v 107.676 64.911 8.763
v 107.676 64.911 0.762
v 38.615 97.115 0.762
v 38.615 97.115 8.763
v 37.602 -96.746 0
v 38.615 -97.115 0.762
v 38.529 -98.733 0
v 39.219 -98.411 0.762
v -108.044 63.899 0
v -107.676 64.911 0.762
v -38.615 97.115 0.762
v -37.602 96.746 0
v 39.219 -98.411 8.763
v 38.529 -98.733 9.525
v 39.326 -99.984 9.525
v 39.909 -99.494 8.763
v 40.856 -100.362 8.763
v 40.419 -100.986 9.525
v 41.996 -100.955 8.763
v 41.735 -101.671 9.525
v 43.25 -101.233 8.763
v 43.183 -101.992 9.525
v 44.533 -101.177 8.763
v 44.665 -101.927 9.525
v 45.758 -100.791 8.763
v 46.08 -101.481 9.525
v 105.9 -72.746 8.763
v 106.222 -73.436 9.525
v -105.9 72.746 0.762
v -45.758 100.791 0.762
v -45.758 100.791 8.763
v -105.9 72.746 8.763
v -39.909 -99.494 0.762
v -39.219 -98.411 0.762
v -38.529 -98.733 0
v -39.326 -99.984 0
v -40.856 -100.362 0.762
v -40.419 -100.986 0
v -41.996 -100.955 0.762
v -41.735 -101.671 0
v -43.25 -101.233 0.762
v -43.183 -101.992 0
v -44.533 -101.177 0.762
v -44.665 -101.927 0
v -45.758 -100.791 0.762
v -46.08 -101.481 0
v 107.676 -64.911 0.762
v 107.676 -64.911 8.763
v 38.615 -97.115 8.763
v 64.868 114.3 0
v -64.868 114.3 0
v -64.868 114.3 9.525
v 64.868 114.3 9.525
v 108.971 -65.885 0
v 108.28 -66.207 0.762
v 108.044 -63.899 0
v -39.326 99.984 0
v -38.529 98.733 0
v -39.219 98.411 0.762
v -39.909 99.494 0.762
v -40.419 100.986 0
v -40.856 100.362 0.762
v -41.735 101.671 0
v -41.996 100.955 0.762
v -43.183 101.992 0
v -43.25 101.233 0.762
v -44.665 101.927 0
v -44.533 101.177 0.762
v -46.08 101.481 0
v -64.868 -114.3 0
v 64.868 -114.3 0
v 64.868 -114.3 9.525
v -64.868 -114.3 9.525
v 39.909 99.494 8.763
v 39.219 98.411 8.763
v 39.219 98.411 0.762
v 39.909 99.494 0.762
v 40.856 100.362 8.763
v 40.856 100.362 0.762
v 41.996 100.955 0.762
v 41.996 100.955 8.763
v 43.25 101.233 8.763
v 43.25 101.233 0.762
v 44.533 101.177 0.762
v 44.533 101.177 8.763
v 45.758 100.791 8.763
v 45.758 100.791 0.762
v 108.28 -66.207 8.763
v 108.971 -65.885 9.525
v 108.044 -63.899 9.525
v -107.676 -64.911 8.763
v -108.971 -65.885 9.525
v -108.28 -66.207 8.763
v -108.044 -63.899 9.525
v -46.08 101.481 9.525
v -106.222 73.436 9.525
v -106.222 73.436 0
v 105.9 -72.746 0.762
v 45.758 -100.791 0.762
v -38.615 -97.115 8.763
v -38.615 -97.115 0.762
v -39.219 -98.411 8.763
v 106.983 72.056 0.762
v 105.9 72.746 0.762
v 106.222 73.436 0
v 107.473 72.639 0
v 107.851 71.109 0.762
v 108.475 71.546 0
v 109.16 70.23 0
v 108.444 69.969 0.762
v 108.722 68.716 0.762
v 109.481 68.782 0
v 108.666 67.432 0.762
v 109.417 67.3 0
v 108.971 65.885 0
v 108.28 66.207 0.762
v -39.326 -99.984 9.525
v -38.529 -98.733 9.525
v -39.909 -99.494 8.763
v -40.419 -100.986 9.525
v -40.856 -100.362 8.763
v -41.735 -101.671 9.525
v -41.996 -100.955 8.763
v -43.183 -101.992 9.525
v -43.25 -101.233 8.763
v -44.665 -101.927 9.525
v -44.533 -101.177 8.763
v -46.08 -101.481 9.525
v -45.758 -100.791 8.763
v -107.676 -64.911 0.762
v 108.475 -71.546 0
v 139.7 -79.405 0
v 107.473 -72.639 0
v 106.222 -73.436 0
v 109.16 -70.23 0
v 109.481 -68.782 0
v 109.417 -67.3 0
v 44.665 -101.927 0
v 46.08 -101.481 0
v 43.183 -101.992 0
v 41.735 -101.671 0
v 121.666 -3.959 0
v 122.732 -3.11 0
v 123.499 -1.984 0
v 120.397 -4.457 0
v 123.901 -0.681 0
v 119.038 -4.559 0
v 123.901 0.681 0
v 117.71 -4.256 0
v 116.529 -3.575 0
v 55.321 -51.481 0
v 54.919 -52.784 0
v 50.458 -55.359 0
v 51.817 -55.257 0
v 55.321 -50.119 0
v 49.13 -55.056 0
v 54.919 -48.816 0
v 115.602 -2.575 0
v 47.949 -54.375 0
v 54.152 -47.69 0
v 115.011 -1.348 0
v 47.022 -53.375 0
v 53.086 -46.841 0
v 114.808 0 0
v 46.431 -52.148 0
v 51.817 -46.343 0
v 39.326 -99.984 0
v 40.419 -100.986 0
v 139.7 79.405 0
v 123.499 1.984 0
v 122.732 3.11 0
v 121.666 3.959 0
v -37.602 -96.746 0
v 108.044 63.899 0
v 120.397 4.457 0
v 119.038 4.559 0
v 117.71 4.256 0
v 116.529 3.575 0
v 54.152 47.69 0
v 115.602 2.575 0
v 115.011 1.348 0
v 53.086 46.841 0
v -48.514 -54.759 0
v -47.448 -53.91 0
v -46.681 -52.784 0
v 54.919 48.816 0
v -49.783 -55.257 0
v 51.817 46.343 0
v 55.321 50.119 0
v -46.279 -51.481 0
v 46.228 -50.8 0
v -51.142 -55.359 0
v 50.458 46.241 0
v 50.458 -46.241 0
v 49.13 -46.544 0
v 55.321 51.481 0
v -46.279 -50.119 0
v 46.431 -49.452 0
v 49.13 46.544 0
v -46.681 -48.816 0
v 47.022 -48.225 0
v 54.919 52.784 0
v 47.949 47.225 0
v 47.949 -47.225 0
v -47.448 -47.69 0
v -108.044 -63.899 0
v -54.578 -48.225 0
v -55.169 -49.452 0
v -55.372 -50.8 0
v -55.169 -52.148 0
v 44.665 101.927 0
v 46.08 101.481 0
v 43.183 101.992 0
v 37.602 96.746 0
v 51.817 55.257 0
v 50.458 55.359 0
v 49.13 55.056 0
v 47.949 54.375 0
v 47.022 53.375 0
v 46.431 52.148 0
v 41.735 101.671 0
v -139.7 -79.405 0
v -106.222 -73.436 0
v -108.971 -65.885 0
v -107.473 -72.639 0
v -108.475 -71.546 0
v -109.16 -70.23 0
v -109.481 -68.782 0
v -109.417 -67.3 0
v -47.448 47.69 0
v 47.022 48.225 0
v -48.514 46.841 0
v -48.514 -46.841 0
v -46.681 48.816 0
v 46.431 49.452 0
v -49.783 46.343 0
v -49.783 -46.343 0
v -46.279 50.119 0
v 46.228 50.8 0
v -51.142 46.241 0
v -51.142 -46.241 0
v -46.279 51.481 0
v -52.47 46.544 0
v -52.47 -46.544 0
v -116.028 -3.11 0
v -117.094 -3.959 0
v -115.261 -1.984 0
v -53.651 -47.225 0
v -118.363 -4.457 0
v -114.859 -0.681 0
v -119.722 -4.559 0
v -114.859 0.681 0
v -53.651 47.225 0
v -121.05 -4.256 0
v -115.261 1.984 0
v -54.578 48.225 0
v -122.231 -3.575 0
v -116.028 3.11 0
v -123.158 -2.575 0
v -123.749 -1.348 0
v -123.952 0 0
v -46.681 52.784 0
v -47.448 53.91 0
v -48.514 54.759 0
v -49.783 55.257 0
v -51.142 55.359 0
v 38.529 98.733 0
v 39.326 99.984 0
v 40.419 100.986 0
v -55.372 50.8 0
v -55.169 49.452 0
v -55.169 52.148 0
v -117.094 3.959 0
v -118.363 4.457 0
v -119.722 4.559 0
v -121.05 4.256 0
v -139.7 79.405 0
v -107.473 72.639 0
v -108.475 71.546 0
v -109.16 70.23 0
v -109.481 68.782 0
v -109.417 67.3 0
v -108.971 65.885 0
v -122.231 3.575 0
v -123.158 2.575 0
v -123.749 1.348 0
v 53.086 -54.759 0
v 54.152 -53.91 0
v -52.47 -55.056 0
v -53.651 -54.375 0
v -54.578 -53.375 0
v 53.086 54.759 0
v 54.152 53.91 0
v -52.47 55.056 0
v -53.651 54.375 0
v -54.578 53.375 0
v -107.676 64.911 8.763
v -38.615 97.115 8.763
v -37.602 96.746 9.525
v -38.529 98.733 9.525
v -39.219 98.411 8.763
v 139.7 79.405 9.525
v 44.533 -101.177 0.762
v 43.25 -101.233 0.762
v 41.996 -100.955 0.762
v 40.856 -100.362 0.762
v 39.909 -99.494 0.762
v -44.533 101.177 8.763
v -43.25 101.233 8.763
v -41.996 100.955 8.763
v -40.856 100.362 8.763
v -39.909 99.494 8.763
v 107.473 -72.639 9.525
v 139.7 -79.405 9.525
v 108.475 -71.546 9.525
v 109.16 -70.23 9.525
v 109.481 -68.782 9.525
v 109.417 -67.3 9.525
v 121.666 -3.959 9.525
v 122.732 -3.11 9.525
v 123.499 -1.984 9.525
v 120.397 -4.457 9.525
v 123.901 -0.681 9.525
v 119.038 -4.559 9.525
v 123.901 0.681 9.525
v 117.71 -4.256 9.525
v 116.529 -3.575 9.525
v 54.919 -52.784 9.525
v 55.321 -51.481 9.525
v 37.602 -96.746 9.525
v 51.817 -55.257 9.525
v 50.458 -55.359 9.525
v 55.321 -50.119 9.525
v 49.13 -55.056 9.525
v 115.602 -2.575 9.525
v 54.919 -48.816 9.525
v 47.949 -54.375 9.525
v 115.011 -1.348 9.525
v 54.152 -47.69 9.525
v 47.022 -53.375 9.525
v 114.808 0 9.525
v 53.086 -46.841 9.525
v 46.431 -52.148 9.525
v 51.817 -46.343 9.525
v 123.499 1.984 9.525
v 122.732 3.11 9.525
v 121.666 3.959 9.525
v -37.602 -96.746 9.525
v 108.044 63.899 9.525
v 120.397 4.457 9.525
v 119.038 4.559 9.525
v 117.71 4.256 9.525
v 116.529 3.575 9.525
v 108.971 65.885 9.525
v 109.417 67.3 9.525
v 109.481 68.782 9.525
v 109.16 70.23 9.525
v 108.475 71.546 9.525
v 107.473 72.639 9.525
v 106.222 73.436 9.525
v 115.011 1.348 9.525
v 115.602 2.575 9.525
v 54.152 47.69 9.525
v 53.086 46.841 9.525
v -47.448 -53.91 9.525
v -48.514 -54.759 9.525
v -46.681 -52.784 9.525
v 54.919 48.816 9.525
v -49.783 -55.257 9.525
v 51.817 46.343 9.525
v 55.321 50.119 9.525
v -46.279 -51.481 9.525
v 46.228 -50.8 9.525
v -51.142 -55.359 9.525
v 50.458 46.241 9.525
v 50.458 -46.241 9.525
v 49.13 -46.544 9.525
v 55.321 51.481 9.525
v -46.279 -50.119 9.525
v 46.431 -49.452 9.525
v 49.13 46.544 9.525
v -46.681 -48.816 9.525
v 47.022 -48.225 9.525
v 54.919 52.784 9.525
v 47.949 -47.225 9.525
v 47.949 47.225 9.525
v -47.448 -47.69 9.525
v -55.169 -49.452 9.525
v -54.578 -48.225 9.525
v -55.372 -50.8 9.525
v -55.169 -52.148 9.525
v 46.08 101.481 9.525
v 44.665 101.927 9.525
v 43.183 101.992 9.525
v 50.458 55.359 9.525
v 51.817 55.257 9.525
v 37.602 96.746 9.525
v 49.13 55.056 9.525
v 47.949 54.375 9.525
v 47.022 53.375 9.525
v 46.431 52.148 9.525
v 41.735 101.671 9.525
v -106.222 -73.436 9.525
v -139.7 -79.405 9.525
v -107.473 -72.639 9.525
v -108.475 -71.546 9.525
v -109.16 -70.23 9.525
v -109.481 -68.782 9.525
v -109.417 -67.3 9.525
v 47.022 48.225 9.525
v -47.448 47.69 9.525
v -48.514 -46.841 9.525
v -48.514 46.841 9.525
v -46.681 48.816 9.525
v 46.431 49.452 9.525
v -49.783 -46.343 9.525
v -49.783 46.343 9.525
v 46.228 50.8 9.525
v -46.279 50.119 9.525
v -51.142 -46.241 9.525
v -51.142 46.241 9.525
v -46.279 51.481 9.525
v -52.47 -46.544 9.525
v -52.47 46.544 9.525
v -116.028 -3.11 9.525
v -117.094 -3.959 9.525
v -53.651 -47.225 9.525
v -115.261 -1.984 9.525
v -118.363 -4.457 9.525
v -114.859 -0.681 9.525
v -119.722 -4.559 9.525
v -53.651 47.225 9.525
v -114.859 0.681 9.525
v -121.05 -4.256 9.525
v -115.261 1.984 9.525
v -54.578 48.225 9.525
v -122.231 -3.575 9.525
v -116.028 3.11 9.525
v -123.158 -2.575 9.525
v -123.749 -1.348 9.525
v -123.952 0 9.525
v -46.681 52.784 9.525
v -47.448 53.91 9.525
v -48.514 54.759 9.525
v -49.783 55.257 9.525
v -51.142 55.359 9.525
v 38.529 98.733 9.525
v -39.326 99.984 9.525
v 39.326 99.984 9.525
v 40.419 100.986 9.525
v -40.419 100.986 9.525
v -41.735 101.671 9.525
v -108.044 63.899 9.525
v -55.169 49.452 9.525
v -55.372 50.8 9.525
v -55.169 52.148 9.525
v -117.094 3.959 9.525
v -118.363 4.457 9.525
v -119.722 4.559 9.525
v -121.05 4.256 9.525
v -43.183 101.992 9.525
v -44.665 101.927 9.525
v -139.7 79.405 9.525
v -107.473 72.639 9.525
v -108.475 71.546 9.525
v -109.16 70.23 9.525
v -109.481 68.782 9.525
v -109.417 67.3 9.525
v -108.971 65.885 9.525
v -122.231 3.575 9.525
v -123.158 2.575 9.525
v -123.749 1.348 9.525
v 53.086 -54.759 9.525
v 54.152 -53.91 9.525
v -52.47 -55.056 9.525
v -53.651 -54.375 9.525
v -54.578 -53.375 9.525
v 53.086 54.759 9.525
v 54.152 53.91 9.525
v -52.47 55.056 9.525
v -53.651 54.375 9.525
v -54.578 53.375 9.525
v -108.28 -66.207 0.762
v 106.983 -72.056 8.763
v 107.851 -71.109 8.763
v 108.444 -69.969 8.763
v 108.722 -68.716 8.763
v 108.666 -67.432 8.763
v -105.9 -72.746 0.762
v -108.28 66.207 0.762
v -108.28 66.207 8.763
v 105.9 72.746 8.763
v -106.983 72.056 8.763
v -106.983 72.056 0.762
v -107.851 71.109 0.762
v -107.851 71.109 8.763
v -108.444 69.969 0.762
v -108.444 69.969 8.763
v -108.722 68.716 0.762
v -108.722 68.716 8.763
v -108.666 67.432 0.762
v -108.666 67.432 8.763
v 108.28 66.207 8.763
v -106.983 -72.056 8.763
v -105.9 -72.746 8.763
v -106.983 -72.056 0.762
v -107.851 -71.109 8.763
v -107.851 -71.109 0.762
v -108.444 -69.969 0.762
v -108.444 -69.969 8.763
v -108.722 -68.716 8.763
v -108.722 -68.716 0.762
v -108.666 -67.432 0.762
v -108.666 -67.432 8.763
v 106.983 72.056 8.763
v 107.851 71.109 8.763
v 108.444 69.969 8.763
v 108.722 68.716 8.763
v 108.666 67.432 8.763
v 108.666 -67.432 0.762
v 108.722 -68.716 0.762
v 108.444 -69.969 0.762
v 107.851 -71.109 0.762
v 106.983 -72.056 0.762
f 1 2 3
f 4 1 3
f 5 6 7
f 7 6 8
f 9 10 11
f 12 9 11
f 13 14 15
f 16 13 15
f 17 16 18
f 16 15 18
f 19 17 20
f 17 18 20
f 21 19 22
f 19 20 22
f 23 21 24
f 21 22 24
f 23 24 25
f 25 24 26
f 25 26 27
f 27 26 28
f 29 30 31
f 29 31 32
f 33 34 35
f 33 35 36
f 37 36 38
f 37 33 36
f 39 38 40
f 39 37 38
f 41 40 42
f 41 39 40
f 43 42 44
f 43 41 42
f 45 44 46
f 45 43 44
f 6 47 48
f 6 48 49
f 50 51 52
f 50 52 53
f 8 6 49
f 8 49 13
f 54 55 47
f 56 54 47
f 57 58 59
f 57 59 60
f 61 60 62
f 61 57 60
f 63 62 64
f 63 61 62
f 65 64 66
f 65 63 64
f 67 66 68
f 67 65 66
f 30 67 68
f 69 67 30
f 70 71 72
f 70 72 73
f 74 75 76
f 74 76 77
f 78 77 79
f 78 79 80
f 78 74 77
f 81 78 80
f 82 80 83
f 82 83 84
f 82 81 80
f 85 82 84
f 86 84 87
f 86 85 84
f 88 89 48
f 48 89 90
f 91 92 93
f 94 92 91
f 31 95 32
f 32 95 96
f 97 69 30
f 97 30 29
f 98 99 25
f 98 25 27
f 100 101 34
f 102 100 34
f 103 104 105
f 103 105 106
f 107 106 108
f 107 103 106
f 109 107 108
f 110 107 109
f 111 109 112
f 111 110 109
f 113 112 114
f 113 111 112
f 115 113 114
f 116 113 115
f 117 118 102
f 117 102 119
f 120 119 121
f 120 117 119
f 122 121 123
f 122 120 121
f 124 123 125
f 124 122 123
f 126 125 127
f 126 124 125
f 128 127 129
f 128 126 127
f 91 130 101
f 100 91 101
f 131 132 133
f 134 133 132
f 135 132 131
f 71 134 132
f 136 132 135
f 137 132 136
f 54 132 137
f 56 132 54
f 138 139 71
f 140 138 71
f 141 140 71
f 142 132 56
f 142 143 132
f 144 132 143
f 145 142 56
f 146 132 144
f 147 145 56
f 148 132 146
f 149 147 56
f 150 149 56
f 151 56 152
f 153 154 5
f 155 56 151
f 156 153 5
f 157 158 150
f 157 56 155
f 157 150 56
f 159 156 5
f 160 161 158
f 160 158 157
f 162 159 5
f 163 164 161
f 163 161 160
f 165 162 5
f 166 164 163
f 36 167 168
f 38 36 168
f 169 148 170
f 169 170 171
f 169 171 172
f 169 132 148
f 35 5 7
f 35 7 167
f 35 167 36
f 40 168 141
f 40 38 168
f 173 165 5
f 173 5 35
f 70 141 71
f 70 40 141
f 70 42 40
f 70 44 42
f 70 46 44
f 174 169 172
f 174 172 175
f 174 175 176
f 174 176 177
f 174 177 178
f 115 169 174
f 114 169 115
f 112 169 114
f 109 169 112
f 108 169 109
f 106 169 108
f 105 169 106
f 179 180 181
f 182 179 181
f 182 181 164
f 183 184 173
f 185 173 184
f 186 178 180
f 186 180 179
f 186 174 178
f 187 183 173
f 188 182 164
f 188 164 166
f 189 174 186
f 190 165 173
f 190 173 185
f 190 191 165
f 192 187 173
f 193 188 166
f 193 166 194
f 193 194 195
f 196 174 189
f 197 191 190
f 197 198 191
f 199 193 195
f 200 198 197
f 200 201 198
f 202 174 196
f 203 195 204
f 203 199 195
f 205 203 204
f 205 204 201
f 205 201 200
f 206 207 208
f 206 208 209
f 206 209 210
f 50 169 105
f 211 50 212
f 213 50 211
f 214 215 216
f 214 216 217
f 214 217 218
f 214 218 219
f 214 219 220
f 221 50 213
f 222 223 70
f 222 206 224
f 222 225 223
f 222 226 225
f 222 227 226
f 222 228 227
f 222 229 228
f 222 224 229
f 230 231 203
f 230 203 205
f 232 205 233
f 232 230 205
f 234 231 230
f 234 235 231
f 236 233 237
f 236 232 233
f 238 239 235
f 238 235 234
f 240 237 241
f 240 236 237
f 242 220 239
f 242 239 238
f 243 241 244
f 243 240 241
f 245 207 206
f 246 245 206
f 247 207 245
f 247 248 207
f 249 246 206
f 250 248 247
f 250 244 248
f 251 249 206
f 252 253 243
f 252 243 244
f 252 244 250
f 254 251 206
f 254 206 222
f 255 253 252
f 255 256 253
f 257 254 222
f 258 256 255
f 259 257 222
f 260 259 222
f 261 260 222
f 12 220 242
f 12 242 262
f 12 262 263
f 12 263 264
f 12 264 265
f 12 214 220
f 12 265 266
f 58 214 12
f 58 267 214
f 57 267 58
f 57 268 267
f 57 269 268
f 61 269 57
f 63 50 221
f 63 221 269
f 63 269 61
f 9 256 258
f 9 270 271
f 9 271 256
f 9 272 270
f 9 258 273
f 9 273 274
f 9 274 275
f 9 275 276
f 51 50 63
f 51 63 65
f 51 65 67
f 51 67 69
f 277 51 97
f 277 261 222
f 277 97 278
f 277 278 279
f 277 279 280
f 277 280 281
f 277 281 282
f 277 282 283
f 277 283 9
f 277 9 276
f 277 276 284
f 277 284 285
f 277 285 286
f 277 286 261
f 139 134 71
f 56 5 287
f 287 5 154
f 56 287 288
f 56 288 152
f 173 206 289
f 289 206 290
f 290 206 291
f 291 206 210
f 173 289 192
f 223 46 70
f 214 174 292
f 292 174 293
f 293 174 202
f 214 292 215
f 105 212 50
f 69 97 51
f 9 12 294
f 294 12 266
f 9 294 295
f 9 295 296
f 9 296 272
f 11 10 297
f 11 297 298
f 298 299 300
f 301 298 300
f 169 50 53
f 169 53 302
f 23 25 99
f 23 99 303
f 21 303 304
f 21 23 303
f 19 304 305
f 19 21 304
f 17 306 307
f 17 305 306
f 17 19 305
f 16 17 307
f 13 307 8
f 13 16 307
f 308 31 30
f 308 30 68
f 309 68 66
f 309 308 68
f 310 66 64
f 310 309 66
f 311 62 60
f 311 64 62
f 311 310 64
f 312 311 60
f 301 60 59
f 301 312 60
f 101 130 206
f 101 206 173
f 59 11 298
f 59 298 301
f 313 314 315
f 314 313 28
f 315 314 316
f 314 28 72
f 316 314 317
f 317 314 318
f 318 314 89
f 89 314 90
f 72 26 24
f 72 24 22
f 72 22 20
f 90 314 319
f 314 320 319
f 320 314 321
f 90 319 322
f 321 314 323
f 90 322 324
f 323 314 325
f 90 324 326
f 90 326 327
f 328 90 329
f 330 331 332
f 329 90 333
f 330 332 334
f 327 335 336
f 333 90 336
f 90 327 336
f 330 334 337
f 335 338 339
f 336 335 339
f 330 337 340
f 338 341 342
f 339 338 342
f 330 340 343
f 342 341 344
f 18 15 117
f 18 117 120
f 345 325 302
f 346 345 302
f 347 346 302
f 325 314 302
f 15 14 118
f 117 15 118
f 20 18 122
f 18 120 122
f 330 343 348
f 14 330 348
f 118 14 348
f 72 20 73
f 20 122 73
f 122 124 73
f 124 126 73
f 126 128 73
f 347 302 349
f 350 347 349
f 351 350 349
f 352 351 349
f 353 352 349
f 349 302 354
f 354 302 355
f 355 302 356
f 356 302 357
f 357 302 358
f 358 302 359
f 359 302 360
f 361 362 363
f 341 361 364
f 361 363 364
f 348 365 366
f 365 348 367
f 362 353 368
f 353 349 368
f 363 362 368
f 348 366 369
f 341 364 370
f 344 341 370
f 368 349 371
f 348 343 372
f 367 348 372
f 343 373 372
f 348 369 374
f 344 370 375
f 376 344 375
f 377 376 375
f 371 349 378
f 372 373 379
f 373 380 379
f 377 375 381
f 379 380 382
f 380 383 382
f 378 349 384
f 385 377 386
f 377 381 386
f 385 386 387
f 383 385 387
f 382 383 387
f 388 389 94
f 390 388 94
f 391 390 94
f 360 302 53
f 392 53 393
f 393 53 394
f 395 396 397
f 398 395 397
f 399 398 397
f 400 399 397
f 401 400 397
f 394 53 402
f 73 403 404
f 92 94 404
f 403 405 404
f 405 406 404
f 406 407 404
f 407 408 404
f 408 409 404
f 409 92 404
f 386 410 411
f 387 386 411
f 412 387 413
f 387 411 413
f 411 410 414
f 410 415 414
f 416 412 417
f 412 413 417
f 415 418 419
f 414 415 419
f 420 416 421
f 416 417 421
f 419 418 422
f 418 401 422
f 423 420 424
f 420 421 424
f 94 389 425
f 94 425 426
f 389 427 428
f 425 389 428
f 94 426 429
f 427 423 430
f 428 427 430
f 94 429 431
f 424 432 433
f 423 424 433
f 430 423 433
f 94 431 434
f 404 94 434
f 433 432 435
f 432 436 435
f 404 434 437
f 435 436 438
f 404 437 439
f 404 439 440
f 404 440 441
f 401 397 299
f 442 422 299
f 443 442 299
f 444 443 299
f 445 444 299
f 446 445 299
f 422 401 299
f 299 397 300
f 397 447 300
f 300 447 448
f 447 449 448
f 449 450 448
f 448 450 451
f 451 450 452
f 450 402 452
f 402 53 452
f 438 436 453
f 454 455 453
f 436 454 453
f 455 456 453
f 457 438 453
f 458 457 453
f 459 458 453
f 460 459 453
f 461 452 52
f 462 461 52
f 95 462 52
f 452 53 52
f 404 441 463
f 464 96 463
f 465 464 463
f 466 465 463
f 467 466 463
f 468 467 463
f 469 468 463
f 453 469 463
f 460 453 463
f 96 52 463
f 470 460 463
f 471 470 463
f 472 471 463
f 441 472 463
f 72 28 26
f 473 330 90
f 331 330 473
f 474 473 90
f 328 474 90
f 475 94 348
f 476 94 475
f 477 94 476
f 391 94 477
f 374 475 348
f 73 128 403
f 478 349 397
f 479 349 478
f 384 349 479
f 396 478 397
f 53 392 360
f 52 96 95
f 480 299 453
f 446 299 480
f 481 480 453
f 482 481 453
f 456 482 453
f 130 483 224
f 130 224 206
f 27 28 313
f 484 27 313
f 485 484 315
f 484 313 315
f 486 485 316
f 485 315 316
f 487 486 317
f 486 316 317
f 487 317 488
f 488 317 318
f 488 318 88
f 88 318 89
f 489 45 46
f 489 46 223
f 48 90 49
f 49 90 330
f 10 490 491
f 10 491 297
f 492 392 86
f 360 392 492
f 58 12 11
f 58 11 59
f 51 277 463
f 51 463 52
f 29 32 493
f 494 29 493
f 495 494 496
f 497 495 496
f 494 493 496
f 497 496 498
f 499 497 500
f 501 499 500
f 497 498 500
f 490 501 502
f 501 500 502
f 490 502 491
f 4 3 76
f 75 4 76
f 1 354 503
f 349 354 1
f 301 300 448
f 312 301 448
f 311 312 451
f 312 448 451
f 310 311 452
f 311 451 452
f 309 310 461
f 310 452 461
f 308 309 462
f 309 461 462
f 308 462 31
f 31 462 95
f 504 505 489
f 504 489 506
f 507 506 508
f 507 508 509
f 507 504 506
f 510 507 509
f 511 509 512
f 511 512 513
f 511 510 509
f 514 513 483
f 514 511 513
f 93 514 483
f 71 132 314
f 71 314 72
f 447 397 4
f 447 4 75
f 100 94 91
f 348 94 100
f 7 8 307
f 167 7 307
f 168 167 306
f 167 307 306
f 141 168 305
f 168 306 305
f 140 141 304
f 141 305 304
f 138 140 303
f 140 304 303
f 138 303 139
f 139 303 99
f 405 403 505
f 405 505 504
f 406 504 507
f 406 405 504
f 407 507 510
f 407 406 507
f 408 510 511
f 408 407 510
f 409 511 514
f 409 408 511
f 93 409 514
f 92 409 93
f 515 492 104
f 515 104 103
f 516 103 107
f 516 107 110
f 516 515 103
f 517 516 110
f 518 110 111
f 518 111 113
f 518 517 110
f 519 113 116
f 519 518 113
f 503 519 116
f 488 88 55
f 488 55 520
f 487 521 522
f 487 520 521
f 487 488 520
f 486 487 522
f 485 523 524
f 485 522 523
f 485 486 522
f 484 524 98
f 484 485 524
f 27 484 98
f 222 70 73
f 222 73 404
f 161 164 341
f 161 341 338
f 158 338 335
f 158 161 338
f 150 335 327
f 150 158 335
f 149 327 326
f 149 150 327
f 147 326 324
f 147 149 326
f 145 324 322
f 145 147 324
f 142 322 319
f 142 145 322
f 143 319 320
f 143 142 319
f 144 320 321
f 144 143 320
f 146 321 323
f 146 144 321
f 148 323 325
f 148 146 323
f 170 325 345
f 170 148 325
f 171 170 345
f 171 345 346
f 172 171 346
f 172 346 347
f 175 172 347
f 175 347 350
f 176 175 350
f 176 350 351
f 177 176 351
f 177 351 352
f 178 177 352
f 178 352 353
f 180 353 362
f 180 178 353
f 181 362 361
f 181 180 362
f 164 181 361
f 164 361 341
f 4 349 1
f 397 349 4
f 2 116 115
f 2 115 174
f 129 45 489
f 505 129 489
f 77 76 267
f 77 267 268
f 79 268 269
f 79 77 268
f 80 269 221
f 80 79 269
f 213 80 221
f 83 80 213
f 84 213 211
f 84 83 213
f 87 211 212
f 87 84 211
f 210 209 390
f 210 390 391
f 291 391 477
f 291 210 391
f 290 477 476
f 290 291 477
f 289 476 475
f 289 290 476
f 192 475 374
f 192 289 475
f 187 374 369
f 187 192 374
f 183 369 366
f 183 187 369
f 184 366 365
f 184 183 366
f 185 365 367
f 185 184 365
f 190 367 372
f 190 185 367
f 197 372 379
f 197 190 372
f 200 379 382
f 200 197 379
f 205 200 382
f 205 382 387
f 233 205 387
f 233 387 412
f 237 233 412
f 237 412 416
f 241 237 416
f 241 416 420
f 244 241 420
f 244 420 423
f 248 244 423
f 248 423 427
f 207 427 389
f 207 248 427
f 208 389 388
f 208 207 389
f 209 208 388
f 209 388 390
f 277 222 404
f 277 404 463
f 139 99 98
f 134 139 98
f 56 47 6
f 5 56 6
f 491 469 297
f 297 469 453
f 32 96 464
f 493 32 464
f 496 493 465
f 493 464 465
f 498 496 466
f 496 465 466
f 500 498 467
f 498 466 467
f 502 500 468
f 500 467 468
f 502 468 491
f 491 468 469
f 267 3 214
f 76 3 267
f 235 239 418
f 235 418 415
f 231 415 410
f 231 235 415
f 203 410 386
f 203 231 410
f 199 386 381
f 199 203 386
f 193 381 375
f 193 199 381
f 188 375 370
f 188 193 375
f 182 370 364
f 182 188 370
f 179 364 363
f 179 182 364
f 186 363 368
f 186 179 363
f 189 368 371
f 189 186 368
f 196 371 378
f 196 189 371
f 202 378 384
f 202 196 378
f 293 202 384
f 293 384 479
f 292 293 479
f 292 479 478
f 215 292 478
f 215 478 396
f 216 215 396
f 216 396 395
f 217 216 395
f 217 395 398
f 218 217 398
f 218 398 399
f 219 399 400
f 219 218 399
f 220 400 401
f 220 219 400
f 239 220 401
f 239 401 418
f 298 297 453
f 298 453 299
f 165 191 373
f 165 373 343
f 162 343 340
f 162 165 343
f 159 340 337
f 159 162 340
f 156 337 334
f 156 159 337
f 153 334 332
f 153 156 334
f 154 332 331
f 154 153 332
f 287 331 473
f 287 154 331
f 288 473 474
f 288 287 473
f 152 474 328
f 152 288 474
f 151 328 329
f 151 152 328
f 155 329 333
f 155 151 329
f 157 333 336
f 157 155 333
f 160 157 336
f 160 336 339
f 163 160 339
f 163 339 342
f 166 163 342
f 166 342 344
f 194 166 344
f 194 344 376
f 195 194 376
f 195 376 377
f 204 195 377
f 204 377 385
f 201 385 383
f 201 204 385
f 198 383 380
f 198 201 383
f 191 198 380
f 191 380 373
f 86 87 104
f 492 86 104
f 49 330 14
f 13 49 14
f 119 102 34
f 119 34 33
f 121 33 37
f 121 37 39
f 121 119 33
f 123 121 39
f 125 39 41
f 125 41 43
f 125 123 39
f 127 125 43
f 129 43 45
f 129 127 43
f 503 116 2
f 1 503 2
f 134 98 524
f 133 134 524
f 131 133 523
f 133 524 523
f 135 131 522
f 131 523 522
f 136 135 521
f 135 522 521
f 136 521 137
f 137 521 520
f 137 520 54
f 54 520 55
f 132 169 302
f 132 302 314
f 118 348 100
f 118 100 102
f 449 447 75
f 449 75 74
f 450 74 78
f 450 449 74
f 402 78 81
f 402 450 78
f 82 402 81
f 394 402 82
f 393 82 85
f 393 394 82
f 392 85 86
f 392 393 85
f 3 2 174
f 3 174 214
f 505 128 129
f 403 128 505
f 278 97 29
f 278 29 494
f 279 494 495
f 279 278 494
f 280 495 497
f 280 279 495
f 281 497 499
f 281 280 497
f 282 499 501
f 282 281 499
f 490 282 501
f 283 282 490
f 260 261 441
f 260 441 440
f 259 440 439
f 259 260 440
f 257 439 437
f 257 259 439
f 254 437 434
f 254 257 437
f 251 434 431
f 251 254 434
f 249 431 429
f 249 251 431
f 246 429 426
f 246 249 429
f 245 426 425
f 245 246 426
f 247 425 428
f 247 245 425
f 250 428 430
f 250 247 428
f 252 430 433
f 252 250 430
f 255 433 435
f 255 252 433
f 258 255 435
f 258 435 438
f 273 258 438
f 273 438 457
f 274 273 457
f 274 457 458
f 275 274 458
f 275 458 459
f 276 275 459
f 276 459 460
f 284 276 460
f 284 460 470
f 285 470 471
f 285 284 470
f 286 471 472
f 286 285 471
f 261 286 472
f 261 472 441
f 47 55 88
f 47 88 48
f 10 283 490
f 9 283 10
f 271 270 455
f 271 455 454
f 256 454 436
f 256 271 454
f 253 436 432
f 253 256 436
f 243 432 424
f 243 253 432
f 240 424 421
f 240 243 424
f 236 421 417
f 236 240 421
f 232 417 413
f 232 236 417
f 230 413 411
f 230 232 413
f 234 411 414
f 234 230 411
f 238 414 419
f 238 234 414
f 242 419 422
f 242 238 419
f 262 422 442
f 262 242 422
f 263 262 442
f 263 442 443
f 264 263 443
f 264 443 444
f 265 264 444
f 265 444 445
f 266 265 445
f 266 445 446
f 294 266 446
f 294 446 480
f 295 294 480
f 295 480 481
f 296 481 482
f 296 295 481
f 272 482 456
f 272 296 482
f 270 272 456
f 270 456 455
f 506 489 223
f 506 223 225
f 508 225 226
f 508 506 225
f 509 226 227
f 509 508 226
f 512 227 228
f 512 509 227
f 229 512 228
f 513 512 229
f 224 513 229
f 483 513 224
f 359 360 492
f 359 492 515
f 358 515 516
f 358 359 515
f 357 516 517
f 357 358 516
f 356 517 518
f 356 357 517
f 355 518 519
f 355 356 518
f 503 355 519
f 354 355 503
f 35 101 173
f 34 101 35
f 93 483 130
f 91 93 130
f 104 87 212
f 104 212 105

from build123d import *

# Parameters (mm, degrees)
SKETCH3_R           = 4.572
BOSS_EXTRUDE1_DEPTH = 9.525
FILLET1_R           = 4.92
FILLET2_R           = 4.92
CHAMFER1_SIZE       = 0.762
CHAMFER2_SIZE       = 0.762
FILLET3_R           = 4.92
FILLET4_R           = 4.92
FILLET5_R           = 4.92
FILLET6_R           = 4.92
FILLET7_R           = 4.92
FILLET8_R           = 4.92
CHAMFER3_SIZE       = 0.762
CHAMFER4_SIZE       = 0.762
CHAMFER5_SIZE       = 0.762


with BuildPart() as part:
    # Sketch3 → Boss-Extrude1 (new body)
    with BuildSketch(Plane.XY):
        Polygon((64.86807053, -114.3), (-64.86807053, -114.3), (-139.7, -79.405298214), (-139.7, 79.405298214), (-64.86807053, 114.3), (64.86807053, 114.3), (139.7, 79.405298214), (139.7, -79.405298214), align=None)
        with Locations(Location((-50.8, 50.8, 0), (0, 0, 180))):
            Circle(SKETCH3_R, mode=Mode.SUBTRACT)
        with Locations(Location((50.8, 50.8, 0), (0, 0, 180))):
            Circle(SKETCH3_R, mode=Mode.SUBTRACT)
        with Locations(Location((50.8, -50.8, 0), (0, 0, 180))):
            Circle(SKETCH3_R, mode=Mode.SUBTRACT)
        with Locations(Location((-50.8, -50.8, 0), (0, 0, 180))):
            Circle(SKETCH3_R, mode=Mode.SUBTRACT)
        with Locations(Location((-119.38, 0, 0), (0, 0, 180))):
            Circle(SKETCH3_R, mode=Mode.SUBTRACT)
        with Locations(Location((119.38, 0, 0), (0, 0, 180))):
            Circle(SKETCH3_R, mode=Mode.SUBTRACT)
        Polygon((-107.675595872, 64.911434008), (-38.6149425, 97.114945552), (-41.298568462, 102.87), (-110.359221834, 70.666488455), align=None, mode=Mode.SUBTRACT)
        Polygon((38.6149425, 97.114945552), (41.298568462, 102.87), (110.359221834, 70.666488455), (107.675595872, 64.911434008), align=None, mode=Mode.SUBTRACT)
        Polygon((-38.6149425, -97.114945552), (-41.298568462, -102.87), (-110.359221834, -70.666488455), (-107.675595872, -64.911434008), align=None, mode=Mode.SUBTRACT)
        Polygon((107.675595872, -64.911434008), (38.6149425, -97.114945552), (41.298568462, -102.87), (110.359221834, -70.666488455), align=None, mode=Mode.SUBTRACT)
    extrude(amount=BOSS_EXTRUDE1_DEPTH)

    # Fillet1
    fillet1_edges = [part.edges().sort_by_distance(p)[0] for p in [
        (-41.298568462, 102.87, 4.7625),
    ]]
    fillet(fillet1_edges, radius=FILLET1_R)

    # Fillet2
    fillet2_edges = [part.edges().sort_by_distance(p)[0] for p in [
        (-110.359221834, 70.666488455, 4.7625),
    ]]
    fillet(fillet2_edges, radius=FILLET2_R)

    # Chamfer1
    chamfer1_edges = [part.edges().sort_by_distance(p)[0] for p in [
        (-75.828895148, 86.768244228, 9.525),
        (-41.995581821, 100.954971534, 9.525),
        (-107.977767929, 65.559444075, 9.525),
        (-108.444193368, 69.969475096, 9.525),
        (-73.145269186, 81.01318978, 9.525),
        (-38.917114557, 97.76295562, 9.525),
    ]]
    chamfer(chamfer1_edges, length=CHAMFER1_SIZE)

    # Chamfer2
    chamfer2_edges = [part.edges().sort_by_distance(p)[0] for p in [
        (-75.828895148, 86.768244228, 0),
        (-41.995581821, 100.954971534, 0),
        (-107.977767929, 65.559444075, 0),
        (-108.444193368, 69.969475096, 0),
        (-73.145269186, 81.01318978, 0),
        (-38.917114557, 97.76295562, 0),
    ]]
    chamfer(chamfer2_edges, length=CHAMFER2_SIZE)

    # Fillet3
    fillet3_edges = [part.edges().sort_by_distance(p)[0] for p in [
        (41.298568462, 102.87, 4.7625),
    ]]
    fillet(fillet3_edges, radius=FILLET3_R)

    # Fillet4
    fillet4_edges = [part.edges().sort_by_distance(p)[0] for p in [
        (110.359221834, 70.666488455, 4.7625),
    ]]
    fillet(fillet4_edges, radius=FILLET4_R)

    # Fillet5
    fillet5_edges = [part.edges().sort_by_distance(p)[0] for p in [
        (110.359221834, -70.666488455, 4.7625),
    ]]
    fillet(fillet5_edges, radius=FILLET5_R)

    # Fillet6
    fillet6_edges = [part.edges().sort_by_distance(p)[0] for p in [
        (41.298568462, -102.87, 4.7625),
    ]]
    fillet(fillet6_edges, radius=FILLET6_R)

    # Fillet7
    fillet7_edges = [part.edges().sort_by_distance(p)[0] for p in [
        (-41.298568462, -102.87, 4.7625),
    ]]
    fillet(fillet7_edges, radius=FILLET7_R)

    # Fillet8
    fillet8_edges = [part.edges().sort_by_distance(p)[0] for p in [
        (-110.359221834, -70.666488455, 4.7625),
    ]]
    fillet(fillet8_edges, radius=FILLET8_R)

    # Chamfer3
    chamfer3_edges = [part.edges().sort_by_distance(p)[0] for p in [
        (38.917114557, 97.76295562, 0),
        (38.917114557, 97.76295562, 9.525),
        (41.995581821, 100.954971534, 0),
        (41.995581821, 100.954971534, 9.525),
        (75.828895148, 86.768244228, 9.525),
        (75.828895148, 86.768244228, 0),
        (108.444193368, 69.969475096, 0),
        (108.444193368, 69.969475096, 9.525),
        (73.145269186, 81.01318978, 0),
        (107.977767929, 65.559444075, 0),
        (73.145269186, 81.01318978, 9.525),
        (107.977767929, 65.559444075, 9.525),
    ]]
    chamfer(chamfer3_edges, length=CHAMFER3_SIZE)

    # Chamfer4
    chamfer4_edges = [part.edges().sort_by_distance(p)[0] for p in [
        (-38.917114557, -97.76295562, 0),
        (-38.917114557, -97.76295562, 9.525),
        (-41.995581821, -100.954971534, 0),
        (-41.995581821, -100.954971534, 9.525),
        (-75.828895148, -86.768244228, 9.525),
        (-75.828895148, -86.768244228, 0),
        (-108.444193368, -69.969475096, 9.525),
        (-108.444193368, -69.969475096, 0),
        (-73.145269186, -81.01318978, 0),
        (-107.977767929, -65.559444075, 0),
        (-73.145269186, -81.01318978, 9.525),
        (-107.977767929, -65.559444075, 9.525),
    ]]
    chamfer(chamfer4_edges, length=CHAMFER4_SIZE)

    # Chamfer5
    chamfer5_edges = [part.edges().sort_by_distance(p)[0] for p in [
        (107.977767929, -65.559444075, 0),
        (107.977767929, -65.559444075, 9.525),
        (108.444193368, -69.969475096, 0),
        (108.444193368, -69.969475096, 9.525),
        (75.828895148, -86.768244228, 9.525),
        (75.828895148, -86.768244228, 0),
        (41.995581821, -100.954971534, 9.525),
        (41.995581821, -100.954971534, 0),
        (73.145269186, -81.01318978, 0),
        (38.917114557, -97.76295562, 0),
        (73.145269186, -81.01318978, 9.525),
        (38.917114557, -97.76295562, 9.525),
    ]]
    chamfer(chamfer5_edges, length=CHAMFER5_SIZE)


solid = part.part
